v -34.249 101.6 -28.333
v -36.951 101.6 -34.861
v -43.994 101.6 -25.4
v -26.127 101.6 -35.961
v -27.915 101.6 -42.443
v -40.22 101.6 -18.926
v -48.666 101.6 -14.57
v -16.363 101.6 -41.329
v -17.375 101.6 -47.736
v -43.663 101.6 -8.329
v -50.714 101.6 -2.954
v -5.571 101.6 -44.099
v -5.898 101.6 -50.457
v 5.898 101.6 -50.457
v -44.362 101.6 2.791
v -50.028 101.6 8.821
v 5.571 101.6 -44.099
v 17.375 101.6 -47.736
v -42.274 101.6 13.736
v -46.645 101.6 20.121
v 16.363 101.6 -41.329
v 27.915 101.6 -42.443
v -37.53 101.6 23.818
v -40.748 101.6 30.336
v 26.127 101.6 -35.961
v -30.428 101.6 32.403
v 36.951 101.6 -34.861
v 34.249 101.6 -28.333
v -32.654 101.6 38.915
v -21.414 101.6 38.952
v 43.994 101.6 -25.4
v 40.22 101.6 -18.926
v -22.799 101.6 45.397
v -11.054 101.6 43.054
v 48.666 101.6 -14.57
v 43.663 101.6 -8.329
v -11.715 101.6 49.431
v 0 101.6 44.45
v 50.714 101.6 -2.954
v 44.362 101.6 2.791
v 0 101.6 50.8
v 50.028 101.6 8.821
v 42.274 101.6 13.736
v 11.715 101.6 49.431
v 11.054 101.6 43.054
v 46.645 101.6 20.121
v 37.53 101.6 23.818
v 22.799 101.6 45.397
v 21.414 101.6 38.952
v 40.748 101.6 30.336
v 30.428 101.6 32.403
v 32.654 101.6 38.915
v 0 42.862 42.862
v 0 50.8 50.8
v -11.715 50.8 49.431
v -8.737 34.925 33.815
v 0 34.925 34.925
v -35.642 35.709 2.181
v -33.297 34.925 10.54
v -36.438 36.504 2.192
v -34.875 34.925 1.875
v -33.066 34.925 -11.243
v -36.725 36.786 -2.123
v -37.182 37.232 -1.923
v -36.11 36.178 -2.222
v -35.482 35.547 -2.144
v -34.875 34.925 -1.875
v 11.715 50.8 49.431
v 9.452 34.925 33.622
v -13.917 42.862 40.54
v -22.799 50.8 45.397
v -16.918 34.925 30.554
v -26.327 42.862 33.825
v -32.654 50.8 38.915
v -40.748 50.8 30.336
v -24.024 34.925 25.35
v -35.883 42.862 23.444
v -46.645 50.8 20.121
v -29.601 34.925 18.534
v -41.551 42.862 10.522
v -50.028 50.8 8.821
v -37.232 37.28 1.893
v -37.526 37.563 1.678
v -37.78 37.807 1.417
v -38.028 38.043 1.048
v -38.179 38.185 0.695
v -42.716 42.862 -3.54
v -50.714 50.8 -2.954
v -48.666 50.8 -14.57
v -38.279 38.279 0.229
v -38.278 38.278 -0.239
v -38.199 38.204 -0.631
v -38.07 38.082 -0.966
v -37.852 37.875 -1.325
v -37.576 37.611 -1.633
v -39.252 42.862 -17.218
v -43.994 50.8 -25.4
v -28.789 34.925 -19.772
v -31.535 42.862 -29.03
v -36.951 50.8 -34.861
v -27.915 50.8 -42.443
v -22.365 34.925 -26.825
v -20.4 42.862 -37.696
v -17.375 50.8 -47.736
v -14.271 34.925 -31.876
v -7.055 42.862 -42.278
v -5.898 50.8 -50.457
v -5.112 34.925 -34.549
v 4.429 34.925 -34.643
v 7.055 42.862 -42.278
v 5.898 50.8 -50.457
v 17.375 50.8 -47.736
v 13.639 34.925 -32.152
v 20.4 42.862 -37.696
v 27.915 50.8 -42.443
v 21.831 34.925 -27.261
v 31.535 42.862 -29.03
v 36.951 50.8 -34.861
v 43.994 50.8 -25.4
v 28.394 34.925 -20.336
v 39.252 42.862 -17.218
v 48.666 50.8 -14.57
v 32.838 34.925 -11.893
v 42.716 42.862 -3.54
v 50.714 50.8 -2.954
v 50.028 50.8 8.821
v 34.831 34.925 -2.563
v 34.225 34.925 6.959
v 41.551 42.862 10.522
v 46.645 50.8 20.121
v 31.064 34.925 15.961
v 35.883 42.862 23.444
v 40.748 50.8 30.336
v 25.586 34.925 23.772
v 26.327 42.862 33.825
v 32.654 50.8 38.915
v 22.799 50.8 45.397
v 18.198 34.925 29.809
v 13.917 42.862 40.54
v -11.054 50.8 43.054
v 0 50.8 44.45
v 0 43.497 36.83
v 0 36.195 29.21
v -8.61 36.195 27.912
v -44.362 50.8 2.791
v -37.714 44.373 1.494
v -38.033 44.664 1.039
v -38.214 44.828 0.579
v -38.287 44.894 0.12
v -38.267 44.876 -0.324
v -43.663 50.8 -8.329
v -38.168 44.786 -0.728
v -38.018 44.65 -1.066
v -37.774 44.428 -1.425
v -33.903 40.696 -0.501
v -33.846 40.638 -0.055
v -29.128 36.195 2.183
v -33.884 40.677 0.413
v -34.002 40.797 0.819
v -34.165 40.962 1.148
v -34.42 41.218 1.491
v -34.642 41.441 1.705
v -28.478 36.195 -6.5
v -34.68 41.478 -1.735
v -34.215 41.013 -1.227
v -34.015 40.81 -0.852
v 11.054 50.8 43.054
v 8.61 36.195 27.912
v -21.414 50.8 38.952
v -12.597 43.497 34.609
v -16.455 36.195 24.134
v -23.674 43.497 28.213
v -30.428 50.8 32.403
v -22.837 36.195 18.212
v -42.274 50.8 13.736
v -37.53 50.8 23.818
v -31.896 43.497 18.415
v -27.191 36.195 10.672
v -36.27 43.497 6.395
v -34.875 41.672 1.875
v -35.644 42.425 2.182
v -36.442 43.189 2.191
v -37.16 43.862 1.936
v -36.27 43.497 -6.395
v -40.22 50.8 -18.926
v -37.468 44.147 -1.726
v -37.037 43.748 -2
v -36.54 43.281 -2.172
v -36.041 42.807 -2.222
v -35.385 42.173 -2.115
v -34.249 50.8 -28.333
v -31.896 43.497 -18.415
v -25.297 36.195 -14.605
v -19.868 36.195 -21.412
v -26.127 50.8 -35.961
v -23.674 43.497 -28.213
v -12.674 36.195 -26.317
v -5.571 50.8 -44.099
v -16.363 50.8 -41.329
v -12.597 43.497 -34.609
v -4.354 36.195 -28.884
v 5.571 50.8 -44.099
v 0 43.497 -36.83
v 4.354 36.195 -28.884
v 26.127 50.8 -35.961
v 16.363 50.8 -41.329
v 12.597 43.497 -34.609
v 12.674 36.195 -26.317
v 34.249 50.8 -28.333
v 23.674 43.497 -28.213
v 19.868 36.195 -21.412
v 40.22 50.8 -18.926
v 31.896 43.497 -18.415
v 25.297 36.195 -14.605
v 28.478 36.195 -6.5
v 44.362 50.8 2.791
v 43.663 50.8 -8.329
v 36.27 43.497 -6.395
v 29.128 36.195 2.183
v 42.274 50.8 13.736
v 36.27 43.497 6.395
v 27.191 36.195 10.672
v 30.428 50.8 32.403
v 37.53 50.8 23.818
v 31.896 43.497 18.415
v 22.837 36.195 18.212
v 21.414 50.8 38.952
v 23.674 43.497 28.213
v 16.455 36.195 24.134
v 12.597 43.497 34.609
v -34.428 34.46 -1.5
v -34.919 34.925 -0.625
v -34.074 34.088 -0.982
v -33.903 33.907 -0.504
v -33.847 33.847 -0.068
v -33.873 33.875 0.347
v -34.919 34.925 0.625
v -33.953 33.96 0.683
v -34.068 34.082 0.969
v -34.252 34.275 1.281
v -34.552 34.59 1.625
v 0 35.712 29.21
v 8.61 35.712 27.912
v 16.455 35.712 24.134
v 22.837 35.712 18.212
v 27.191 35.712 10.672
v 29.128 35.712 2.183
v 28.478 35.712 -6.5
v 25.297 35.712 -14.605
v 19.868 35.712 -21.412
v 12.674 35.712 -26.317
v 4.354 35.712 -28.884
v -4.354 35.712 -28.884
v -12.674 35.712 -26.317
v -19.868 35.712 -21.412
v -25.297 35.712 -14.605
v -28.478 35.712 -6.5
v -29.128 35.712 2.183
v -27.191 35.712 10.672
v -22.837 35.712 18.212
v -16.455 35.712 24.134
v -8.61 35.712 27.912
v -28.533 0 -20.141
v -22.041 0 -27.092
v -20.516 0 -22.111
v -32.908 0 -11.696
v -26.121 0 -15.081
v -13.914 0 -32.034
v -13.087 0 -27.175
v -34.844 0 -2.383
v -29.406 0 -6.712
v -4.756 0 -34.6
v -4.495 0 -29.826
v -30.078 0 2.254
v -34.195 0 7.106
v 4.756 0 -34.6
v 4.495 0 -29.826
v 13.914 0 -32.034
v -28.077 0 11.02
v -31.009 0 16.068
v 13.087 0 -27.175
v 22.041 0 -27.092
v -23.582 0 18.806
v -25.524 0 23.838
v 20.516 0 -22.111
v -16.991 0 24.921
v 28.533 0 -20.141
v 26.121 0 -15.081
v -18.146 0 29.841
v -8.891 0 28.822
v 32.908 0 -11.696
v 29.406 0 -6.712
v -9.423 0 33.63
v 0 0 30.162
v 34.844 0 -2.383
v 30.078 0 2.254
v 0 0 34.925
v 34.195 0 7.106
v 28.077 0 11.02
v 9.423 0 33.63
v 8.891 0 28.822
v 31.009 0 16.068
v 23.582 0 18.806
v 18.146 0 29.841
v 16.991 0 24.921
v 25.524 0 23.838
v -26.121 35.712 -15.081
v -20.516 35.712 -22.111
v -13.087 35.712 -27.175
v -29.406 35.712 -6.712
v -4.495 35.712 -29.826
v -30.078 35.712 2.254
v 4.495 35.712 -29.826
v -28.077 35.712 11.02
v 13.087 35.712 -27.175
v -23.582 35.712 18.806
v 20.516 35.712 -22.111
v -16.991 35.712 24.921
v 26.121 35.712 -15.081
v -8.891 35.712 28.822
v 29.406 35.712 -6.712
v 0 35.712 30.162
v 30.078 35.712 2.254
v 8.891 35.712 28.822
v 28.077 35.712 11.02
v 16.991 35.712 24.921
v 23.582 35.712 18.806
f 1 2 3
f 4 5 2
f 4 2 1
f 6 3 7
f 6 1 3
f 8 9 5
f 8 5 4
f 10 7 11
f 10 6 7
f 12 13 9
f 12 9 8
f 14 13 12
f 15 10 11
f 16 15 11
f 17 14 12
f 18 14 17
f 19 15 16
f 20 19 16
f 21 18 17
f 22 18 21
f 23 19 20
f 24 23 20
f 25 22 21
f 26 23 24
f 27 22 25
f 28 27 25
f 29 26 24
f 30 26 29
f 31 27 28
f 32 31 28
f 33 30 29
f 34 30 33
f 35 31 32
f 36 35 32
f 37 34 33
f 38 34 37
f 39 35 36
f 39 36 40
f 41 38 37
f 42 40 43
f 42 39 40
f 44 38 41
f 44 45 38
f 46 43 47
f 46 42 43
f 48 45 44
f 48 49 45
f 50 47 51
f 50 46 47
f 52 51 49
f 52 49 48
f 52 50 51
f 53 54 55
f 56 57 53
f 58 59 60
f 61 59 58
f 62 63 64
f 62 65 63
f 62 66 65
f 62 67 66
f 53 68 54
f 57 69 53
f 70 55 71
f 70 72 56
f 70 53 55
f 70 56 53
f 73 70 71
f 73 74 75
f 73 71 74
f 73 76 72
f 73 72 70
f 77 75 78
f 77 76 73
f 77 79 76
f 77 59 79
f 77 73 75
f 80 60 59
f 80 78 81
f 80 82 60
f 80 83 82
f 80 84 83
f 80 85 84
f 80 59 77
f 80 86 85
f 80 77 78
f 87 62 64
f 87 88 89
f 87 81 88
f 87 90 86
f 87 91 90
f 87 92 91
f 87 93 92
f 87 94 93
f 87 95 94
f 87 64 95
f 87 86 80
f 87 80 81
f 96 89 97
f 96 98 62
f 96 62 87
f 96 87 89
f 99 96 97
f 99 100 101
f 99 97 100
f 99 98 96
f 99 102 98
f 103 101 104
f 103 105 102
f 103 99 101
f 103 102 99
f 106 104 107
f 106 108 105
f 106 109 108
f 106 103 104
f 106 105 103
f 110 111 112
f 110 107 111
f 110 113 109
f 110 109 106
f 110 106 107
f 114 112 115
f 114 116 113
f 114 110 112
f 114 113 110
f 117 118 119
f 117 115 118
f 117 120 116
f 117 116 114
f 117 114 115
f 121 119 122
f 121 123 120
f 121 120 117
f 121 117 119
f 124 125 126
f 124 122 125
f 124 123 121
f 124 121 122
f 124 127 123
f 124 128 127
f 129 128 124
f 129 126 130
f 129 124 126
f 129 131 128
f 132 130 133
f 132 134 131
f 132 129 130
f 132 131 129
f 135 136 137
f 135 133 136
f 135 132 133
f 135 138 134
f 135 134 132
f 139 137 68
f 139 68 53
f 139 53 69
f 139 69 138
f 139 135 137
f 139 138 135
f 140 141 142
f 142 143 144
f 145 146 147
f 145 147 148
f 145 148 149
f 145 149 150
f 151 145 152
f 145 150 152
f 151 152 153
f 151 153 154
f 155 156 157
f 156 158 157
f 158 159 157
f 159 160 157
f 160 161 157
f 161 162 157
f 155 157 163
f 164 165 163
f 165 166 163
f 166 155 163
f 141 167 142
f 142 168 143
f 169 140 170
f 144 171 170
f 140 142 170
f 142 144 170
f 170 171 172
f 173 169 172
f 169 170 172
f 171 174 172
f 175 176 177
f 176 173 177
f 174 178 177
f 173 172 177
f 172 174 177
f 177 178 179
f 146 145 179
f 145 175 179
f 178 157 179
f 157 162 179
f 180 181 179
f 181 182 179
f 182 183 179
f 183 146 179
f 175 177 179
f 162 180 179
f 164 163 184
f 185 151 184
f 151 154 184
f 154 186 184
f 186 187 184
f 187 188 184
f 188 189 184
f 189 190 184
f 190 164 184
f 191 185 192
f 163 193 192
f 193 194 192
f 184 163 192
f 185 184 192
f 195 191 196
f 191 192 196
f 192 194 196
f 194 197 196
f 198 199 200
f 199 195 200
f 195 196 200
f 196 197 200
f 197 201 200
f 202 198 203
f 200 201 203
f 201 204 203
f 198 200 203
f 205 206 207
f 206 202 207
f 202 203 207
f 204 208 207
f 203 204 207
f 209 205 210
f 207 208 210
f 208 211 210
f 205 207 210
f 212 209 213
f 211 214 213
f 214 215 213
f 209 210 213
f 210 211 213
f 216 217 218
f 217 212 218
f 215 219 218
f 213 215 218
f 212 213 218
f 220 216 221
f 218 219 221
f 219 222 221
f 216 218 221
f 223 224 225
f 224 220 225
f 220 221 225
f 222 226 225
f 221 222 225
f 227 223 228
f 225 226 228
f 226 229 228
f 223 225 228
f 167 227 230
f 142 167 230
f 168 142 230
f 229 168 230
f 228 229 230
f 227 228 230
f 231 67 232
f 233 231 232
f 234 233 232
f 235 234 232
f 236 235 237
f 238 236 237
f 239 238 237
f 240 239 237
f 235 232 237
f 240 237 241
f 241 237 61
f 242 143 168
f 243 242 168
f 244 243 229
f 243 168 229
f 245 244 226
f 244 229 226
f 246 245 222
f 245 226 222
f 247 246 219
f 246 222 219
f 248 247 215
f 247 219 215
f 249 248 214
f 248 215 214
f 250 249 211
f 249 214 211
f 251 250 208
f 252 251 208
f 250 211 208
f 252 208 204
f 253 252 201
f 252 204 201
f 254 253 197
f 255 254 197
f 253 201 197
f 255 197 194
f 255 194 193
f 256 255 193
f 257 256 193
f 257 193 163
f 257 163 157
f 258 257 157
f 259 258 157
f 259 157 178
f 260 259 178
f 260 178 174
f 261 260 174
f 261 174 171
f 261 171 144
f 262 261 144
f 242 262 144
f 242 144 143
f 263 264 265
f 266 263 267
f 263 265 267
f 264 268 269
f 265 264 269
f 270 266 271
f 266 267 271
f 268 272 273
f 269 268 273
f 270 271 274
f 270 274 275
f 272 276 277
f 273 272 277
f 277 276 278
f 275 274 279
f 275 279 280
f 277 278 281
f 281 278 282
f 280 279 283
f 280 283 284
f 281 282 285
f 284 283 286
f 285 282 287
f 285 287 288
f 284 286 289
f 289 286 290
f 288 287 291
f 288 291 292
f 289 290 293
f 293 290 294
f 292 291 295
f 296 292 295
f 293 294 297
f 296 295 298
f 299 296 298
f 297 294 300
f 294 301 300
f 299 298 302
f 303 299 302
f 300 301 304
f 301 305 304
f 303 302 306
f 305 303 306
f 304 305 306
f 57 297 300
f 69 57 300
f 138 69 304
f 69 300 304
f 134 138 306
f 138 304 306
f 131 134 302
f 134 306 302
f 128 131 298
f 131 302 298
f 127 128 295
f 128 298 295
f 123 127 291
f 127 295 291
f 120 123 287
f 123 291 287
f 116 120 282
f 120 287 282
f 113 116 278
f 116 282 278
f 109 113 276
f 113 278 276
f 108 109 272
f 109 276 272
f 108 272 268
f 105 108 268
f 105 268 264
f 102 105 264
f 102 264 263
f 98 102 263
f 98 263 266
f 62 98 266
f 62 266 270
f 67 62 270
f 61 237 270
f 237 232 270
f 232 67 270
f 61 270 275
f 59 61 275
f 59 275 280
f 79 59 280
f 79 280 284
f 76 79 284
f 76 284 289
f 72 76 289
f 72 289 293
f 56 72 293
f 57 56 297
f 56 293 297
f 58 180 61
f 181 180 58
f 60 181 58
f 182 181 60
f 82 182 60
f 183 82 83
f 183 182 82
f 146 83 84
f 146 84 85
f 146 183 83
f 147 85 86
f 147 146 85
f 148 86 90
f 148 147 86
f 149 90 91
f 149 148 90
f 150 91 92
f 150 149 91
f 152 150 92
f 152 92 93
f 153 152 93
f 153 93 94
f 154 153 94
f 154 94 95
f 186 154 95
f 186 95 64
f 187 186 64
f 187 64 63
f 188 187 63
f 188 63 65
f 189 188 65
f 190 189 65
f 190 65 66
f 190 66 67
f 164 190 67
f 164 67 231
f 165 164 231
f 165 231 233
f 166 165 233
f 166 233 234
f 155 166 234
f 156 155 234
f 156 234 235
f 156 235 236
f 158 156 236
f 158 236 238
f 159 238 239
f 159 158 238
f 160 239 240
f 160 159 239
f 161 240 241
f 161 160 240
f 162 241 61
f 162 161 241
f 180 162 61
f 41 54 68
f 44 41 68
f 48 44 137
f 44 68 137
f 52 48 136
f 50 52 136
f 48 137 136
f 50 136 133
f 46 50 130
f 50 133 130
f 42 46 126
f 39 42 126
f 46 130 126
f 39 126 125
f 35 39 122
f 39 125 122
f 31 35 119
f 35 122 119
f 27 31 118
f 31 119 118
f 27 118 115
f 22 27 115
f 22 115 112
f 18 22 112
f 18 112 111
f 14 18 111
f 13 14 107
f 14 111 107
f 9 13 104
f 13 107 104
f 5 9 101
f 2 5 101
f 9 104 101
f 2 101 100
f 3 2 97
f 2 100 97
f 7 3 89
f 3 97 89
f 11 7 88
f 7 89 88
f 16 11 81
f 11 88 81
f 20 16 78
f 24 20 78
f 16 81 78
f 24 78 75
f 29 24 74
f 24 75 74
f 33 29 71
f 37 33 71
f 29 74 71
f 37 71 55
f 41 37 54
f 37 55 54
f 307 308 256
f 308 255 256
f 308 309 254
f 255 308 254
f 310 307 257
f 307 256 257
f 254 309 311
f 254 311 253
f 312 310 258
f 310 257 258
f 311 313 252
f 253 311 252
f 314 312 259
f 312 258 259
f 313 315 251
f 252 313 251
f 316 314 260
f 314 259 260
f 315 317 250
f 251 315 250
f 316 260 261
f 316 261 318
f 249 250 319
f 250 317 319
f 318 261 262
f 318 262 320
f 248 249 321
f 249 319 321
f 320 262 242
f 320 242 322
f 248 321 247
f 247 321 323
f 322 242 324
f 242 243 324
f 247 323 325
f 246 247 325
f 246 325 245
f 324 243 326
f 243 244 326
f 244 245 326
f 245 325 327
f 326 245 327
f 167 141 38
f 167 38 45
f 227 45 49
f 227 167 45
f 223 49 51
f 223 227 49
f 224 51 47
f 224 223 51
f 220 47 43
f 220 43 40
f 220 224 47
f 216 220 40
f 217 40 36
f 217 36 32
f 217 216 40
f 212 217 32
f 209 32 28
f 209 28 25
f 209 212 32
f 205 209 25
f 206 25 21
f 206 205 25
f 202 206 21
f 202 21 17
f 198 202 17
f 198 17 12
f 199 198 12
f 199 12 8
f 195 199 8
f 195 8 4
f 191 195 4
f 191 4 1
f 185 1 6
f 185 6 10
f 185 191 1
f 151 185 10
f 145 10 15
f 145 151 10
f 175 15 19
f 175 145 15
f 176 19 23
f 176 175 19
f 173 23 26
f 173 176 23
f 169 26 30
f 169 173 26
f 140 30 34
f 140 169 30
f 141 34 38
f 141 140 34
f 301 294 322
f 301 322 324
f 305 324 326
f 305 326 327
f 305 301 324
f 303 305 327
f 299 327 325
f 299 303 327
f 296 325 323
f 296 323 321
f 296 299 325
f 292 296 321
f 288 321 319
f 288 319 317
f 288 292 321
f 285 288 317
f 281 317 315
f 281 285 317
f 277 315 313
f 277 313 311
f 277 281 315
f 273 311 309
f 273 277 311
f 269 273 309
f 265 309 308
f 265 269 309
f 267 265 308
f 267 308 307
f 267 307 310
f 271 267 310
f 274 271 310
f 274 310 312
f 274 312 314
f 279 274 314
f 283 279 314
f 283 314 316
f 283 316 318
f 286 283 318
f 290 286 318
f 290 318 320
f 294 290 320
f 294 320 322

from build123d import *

# Parameters (mm, degrees)
SKETCH1_R           = 34.925
SKETCH1_R_2         = 30.1625
BOSS_EXTRUDE1_DEPTH = 50.8
SKETCH2_R           = 50.8
SKETCH2_R_2         = 44.45
BOSS_EXTRUDE2_DEPTH = 50.8
SKETCH4_R           = 30.1625
SKETCH4_R_2         = 29.21
BOSS_EXTRUDE3_DEPTH = 15.0876
CUT_EXTRUDE1_REACH  = 89.988
SKETCH6_R           = 2.2225


with BuildPart() as part:
    # Sketch1 → Boss-Extrude1 (new body)
    with BuildSketch(Plane(origin=(0, 0, 0), x_dir=(1, 0, 0), z_dir=(0, 1, 0))):
        with Locations(Location((0, 0, 0), (0, 0, 270))):
            Circle(SKETCH1_R)
        with Locations(Location((0, 0, 0), (0, 0, 270))):
            Circle(SKETCH1_R_2, mode=Mode.SUBTRACT)
    extrude(amount=BOSS_EXTRUDE1_DEPTH)



with BuildPart() as body_2:
    # Sketch2 → Boss-Extrude2 (new body)
    with BuildSketch(Plane(origin=(0, 50.8, 0), x_dir=(1, 0, 0), z_dir=(0, 1, 0))):
        with Locations(Location((0, 0, 0), (0, 0, 270))):
            Circle(SKETCH2_R)
        with Locations(Location((0, 0, 0), (0, 0, 270))):
            Circle(SKETCH2_R_2, mode=Mode.SUBTRACT)
    extrude(amount=BOSS_EXTRUDE2_DEPTH)


with BuildPart() as part_1:
    add(part.part)

    add(body_2.part)  # Revolve1 merges body 2
    # Sketch3 → Revolve1 (revolve)
    with BuildSketch(Plane.XY, mode=Mode.PRIVATE) as revolve1_sk:
        Polygon((50.8, 50.8), (34.925, 34.925), (34.925, 50.8), align=None)
    revolve(revolve1_sk.sketch.rotate(Axis((0, 101.6, 0), (0, -1, 0)), 90), axis=Axis((0, 101.6, 0), (0, -1, 0)))

    # Sketch4 → Boss-Extrude3 (add)
    with BuildSketch(Plane(origin=(0, 50.8, 0), x_dir=(1, 0, 0), z_dir=(0, 1, 0))):
        with Locations(Location((0, 0, 0), (0, 0, 270))):
            Circle(SKETCH4_R)
        with Locations(Location((0, 0, 0), (0, 0, 270))):
            Circle(SKETCH4_R_2, mode=Mode.SUBTRACT)
    extrude(amount=-BOSS_EXTRUDE3_DEPTH)

    # Sketch5 → Cut-Revolve1 (revolve, cut)
    with BuildSketch(Plane(origin=(0, 0, 0), x_dir=(0, 0, -1), z_dir=(1, 0, 0))):
        Polygon((-44.45, 50.8), (-29.21, 36.195), (-29.21, 50.8), align=None)
    revolve(axis=Axis((0, 101.6, 0), (0, -1, 0)), mode=Mode.SUBTRACT)

    # Cut-Extrude1: up to this cone (the profile starts inside it)
    cut_extrude1_end = Plane(origin=(0, 50.8, 0), z_dir=(0, 1, 0)).offset(-50.799999) * Cone(1e-06, 192.088, 192.087999, align=(Align.CENTER, Align.CENTER, Align.MIN), mode=Mode.PRIVATE)
    # Sketch6 → Cut-Extrude1 (cut, up to the surface)
    with BuildSketch(Plane(origin=(0, 50.8, 0), x_dir=(-1, 0, 0), z_dir=(0, -1, 0)), mode=Mode.PRIVATE) as cut_extrude1_sk1:
        with Locations(Location((36.068, 0, 0), (0, 0, 237.524024199))):
            Circle(SKETCH6_R)
    cut_extrude1_tool1 = extrude(cut_extrude1_sk1.sketch, amount=CUT_EXTRUDE1_REACH, mode=Mode.PRIVATE) & cut_extrude1_end
    add(cut_extrude1_tool1.solids().sort_by_distance((-36.068, 50.8, 0))[0], mode=Mode.SUBTRACT)


solid = part_1.part
